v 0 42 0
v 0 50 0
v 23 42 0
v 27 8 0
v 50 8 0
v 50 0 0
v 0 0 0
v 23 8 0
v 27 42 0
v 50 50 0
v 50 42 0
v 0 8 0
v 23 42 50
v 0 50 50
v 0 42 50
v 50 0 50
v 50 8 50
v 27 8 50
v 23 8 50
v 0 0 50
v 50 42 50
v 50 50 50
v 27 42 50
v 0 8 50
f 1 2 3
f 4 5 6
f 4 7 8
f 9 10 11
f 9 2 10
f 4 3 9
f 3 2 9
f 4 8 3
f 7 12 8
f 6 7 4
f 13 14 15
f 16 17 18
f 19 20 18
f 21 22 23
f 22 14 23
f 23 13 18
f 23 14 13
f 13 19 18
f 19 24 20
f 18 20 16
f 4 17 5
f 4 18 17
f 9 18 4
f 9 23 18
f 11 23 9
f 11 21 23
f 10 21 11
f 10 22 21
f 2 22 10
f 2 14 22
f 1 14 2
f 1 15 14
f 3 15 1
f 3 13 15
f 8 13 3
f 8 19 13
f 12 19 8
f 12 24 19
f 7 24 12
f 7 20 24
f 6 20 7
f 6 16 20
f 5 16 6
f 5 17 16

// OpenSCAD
$fn = 32;

// ----------------------------------------------------------------------
// Structural section: ibeam 50 x 50 mm
// ----------------------------------------------------------------------

// --- parameters (mm) ---
sec_w = 50;               // section width, X
sec_h = 50;               // section height, Y
flange_t = 8;             // flange thickness
web_t = 4;                // web thickness
plate_t = 50;             // cut length, Z (extrusion height)

profile = [[0, 0], [50, 0], [50, 8], [27, 8], [27, 42], [50, 42], [50, 50], [0, 50], [0, 42], [23, 42], [23, 8], [0, 8]];  // primary outline, 12 points, counter clockwise

// --- the one profile operation ---
linear_extrude(height = plate_t) polygon(points = profile);
